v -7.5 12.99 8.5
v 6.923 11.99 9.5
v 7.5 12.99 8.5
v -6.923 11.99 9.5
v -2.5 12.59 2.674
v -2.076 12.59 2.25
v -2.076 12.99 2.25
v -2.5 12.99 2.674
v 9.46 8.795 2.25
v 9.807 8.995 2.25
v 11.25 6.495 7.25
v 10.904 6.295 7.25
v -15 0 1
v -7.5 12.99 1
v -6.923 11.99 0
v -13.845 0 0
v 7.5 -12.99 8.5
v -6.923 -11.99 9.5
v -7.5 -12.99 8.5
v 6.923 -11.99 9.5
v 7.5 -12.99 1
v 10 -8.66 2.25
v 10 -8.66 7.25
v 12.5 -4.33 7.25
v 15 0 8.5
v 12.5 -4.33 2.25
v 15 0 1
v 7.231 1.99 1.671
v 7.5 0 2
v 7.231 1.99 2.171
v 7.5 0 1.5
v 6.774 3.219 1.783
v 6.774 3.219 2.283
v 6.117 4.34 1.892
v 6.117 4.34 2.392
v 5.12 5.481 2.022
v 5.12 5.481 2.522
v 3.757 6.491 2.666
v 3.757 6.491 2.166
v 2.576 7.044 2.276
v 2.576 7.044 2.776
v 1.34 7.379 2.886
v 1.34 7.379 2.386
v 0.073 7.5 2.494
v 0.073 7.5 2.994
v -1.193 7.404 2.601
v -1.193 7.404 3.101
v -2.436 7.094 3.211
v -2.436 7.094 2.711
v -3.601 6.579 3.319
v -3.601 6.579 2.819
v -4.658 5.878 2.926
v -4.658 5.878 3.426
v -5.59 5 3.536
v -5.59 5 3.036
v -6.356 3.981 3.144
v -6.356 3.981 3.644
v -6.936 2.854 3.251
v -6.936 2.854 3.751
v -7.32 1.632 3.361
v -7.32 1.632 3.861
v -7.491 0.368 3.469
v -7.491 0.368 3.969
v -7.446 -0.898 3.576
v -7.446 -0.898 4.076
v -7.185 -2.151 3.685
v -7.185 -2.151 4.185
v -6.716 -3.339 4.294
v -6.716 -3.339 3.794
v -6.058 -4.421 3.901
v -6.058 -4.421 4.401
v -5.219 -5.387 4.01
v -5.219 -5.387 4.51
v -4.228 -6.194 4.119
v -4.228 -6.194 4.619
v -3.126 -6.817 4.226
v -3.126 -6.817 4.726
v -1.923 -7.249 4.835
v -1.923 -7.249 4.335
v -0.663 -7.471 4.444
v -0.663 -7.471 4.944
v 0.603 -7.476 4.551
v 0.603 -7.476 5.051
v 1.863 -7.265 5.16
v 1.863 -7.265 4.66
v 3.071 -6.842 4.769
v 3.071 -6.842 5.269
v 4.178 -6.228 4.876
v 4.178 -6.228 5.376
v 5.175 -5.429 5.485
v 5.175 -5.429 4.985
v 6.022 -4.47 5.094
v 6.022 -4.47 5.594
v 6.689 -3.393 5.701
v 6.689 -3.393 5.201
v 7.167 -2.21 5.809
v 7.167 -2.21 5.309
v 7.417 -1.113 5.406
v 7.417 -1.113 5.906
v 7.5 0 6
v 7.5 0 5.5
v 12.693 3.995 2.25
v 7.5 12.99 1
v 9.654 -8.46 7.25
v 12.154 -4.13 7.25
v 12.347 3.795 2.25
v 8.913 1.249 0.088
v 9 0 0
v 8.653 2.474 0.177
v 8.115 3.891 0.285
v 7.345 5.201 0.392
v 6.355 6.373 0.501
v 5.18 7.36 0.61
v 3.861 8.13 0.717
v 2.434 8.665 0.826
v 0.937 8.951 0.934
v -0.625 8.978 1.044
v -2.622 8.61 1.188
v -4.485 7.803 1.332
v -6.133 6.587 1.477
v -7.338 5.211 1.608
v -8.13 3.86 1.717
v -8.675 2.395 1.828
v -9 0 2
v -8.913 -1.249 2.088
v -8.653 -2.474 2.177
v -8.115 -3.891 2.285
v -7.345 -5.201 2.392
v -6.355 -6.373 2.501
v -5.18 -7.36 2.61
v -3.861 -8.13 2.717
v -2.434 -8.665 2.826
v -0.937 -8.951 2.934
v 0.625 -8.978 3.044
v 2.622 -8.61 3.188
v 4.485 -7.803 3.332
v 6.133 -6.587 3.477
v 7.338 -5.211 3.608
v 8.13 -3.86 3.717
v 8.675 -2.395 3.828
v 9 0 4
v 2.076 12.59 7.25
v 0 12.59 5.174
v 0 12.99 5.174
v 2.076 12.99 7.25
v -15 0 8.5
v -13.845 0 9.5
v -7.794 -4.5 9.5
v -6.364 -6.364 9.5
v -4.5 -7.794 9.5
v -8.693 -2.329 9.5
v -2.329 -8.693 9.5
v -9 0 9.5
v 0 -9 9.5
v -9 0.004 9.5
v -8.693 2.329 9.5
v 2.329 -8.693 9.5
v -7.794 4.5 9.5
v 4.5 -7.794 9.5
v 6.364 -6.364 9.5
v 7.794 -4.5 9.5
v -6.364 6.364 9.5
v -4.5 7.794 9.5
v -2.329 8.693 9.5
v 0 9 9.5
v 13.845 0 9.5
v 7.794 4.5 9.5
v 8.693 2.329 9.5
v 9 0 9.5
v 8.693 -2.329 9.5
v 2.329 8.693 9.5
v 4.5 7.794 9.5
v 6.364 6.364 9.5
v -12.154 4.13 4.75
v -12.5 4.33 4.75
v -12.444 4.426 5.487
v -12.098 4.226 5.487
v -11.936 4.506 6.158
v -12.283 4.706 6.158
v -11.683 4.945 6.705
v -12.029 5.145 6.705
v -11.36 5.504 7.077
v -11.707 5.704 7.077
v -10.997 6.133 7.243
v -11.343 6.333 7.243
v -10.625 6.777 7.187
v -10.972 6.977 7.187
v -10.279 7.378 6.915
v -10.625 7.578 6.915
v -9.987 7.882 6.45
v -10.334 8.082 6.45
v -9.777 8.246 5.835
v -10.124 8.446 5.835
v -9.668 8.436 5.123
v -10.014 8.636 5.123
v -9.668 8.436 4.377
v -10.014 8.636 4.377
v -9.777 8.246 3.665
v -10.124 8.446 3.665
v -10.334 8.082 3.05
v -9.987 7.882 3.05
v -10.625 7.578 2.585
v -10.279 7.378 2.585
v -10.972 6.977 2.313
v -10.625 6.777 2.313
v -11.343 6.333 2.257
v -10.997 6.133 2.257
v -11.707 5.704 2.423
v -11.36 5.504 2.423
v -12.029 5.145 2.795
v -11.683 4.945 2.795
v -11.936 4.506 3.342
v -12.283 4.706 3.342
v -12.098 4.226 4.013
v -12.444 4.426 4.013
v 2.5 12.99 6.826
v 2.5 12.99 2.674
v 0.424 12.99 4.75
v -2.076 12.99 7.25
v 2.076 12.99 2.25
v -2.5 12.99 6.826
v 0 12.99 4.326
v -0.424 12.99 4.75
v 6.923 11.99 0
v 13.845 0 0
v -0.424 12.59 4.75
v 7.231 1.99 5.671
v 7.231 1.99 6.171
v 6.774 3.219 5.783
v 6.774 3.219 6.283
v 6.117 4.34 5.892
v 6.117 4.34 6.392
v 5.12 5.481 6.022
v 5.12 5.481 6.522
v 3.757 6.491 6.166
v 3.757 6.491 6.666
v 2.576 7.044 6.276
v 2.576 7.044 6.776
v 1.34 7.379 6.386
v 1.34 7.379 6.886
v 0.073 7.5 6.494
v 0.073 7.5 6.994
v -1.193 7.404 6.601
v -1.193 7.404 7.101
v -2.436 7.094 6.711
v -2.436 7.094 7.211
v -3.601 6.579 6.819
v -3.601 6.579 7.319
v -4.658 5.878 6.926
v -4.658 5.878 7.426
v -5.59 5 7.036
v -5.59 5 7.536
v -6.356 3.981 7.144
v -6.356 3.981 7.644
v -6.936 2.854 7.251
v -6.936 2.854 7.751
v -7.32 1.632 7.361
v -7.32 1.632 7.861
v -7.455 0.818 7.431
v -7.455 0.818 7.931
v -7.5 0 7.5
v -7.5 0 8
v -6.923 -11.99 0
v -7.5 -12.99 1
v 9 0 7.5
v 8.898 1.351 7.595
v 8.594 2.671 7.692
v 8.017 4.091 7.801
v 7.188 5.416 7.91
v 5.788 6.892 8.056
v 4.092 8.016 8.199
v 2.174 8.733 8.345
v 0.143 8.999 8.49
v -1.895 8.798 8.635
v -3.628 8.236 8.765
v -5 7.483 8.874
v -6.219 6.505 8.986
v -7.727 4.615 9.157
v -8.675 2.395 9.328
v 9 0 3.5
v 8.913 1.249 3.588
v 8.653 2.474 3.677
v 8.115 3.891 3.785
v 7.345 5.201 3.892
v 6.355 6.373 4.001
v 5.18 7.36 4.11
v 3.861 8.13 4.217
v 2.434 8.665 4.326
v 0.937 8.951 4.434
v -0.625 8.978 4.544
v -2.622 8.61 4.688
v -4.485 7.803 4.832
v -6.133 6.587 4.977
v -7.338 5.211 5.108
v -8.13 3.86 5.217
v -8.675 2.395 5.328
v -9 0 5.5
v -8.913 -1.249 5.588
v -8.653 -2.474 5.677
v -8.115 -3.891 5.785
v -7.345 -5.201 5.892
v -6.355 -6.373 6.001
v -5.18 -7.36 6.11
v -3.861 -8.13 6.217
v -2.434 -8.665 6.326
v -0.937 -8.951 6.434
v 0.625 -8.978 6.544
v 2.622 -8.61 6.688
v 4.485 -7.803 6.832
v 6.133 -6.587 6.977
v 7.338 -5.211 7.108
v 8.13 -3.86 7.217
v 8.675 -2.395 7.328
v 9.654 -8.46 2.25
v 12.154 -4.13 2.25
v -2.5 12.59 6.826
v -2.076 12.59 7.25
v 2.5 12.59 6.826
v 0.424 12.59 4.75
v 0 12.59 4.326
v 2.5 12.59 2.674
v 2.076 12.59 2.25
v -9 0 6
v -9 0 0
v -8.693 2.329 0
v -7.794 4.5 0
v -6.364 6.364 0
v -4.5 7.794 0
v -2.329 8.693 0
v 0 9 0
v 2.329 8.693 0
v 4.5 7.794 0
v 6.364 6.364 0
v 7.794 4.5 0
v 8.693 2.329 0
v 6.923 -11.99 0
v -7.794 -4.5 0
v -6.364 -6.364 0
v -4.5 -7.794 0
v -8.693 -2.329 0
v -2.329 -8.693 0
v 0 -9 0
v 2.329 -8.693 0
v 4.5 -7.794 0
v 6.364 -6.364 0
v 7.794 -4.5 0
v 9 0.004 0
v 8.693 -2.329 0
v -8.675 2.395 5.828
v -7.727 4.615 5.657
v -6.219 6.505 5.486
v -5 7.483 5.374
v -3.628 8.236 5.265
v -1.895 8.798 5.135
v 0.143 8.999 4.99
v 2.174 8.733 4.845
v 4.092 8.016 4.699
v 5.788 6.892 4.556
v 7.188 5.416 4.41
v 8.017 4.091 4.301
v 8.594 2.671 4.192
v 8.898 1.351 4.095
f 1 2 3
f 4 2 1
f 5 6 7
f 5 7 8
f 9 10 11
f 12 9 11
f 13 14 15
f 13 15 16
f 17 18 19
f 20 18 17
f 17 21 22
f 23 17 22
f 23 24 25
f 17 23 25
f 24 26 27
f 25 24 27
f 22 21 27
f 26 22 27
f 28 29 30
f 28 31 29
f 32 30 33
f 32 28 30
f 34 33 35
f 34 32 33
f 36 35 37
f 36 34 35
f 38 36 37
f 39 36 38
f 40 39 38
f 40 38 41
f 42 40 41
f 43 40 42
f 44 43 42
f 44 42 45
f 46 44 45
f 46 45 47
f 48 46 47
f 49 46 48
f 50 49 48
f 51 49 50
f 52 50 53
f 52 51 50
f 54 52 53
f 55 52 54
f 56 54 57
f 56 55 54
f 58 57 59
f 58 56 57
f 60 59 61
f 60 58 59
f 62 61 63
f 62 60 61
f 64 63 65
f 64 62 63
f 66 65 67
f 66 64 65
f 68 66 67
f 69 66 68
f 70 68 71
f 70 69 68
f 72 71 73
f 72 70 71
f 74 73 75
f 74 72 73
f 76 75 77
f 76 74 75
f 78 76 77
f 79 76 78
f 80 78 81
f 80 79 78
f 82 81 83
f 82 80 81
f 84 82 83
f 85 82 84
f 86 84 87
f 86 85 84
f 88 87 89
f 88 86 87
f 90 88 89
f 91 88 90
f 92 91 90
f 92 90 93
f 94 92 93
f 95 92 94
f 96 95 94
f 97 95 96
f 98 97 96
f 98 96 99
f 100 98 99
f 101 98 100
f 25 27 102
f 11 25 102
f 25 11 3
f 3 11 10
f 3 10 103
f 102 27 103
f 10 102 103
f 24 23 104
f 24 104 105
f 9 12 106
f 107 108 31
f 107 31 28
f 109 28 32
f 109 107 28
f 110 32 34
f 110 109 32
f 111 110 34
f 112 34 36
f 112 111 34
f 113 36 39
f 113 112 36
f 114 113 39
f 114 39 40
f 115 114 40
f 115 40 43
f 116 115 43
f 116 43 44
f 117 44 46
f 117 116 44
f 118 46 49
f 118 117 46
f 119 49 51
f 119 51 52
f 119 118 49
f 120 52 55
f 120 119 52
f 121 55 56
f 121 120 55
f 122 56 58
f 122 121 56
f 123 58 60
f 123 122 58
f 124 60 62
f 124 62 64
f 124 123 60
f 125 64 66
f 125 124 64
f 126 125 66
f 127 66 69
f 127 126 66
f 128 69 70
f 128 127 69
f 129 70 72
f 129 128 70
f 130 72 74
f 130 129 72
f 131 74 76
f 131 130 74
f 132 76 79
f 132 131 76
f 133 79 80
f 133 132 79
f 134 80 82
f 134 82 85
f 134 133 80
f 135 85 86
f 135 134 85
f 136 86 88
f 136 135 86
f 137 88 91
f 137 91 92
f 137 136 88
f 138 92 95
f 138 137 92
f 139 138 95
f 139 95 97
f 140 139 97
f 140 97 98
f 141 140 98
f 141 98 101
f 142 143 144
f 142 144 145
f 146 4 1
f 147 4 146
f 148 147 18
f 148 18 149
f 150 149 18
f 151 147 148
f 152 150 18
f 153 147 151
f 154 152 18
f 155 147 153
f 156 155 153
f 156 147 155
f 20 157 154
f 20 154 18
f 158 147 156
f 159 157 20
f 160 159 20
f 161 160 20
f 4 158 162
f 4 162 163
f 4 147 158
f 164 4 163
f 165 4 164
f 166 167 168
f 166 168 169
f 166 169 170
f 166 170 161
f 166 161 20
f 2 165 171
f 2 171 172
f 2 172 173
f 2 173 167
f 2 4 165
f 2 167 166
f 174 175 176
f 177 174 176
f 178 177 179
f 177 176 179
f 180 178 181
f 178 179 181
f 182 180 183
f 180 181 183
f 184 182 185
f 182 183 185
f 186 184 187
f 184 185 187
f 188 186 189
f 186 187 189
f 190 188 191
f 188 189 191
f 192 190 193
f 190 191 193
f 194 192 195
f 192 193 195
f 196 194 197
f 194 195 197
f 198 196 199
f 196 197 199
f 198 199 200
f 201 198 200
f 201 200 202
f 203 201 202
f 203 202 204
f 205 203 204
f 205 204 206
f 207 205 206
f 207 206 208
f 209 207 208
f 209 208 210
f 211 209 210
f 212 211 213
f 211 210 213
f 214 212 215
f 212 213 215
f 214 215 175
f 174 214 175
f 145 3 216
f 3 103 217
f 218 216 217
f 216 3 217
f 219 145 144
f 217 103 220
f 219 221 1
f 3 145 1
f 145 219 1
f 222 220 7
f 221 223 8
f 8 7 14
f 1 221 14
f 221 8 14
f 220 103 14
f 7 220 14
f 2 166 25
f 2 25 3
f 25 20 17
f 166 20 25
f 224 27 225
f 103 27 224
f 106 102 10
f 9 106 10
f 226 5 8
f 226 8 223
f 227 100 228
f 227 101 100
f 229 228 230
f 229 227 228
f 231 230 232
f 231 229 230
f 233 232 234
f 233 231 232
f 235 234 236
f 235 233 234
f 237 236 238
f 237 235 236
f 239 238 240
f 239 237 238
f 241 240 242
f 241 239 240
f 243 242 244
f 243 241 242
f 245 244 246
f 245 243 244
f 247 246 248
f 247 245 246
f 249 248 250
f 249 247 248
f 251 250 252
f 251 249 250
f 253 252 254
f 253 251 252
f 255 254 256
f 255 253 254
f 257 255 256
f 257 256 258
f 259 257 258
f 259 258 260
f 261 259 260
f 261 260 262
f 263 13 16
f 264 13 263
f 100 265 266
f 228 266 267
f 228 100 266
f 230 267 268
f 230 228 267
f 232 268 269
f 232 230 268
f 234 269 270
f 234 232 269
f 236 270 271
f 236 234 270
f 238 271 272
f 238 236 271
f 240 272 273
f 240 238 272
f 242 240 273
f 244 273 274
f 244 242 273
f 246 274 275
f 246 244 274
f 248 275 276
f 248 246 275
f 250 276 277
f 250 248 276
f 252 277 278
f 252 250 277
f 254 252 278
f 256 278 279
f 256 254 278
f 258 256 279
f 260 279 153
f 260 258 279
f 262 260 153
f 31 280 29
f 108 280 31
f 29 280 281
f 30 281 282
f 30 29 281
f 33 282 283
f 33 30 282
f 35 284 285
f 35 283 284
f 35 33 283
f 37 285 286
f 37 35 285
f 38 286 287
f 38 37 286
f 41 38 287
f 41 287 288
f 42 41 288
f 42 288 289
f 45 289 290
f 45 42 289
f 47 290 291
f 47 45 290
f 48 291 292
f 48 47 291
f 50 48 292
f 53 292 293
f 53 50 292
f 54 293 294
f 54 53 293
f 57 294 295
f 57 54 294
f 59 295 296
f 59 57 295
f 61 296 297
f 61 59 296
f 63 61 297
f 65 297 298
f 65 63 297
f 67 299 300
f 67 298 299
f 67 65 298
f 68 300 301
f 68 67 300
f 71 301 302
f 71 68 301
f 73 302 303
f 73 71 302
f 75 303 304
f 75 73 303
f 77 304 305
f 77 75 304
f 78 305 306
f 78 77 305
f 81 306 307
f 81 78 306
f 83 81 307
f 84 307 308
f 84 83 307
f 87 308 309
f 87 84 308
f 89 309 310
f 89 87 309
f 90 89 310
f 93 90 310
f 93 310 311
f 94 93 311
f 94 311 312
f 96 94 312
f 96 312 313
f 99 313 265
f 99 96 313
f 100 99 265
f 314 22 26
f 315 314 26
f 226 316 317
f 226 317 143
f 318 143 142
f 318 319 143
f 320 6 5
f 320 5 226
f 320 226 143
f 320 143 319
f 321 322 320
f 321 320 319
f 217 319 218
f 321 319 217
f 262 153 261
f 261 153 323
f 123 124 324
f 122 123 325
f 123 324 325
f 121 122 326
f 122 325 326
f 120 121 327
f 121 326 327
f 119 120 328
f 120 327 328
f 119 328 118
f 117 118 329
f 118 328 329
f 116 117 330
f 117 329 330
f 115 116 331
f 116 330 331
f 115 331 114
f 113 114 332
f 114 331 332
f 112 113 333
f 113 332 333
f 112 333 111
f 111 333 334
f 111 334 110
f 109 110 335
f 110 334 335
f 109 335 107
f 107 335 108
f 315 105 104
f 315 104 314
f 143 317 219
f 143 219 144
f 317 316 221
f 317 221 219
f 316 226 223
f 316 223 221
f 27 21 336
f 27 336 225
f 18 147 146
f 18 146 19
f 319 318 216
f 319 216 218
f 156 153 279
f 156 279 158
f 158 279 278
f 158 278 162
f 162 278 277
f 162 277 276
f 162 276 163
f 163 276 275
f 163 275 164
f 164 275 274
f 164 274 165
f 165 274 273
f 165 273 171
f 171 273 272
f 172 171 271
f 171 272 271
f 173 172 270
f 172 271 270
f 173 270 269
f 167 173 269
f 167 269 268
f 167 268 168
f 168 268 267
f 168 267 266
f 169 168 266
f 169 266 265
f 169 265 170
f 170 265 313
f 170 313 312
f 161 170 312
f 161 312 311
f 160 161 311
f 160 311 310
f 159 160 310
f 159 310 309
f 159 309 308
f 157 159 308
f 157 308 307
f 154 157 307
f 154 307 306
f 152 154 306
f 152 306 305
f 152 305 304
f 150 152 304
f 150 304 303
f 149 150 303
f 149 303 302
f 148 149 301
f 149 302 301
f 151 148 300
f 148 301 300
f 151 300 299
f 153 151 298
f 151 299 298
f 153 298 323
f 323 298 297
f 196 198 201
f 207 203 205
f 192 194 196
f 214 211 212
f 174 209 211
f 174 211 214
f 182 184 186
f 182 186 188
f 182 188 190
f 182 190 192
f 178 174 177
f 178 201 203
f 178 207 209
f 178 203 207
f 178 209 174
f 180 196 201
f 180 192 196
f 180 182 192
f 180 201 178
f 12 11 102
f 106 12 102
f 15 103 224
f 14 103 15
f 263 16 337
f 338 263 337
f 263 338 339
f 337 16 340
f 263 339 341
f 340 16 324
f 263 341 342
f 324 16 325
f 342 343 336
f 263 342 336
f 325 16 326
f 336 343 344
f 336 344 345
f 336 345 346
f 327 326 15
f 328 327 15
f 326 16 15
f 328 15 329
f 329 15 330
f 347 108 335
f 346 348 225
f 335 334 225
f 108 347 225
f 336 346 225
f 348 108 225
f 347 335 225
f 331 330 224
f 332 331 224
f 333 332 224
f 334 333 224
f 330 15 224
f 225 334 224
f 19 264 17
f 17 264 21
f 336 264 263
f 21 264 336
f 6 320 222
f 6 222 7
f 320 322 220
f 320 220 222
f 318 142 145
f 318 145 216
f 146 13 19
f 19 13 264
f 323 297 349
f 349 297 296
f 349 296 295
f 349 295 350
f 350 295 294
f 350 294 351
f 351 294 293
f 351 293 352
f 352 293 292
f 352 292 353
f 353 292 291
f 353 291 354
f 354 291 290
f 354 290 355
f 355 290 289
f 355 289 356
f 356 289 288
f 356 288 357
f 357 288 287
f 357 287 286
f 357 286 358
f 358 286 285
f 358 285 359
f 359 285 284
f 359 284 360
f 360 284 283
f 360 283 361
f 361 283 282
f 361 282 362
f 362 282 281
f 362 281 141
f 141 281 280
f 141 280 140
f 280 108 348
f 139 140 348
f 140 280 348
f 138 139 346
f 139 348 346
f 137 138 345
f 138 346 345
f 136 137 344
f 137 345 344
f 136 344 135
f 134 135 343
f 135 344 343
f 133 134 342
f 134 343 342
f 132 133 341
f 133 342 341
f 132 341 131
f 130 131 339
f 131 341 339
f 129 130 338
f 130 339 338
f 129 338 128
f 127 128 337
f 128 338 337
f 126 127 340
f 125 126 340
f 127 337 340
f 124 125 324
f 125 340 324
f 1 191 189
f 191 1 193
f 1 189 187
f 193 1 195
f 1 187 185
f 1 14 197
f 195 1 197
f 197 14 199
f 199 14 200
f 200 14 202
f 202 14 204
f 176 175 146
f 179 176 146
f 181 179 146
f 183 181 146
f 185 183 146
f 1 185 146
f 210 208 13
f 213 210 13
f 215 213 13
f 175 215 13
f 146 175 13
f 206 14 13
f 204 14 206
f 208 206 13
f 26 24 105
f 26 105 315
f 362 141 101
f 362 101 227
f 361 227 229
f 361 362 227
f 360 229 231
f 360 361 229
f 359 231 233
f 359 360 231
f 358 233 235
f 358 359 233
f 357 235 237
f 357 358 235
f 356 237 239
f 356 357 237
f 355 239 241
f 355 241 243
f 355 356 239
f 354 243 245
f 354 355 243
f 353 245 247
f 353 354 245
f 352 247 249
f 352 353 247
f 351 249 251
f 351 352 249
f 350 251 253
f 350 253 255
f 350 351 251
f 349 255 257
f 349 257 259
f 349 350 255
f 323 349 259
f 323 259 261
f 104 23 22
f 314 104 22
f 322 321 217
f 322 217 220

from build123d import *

# Parameters (mm, degrees)
EXTRUDE_1_DEPTH          = 9.5
SKETCH_3_R               = 9
CUT_EXTRUDE_1_DEPTH      = 10
SWEEP_1_PITCH            = 4
CHAMFER_1_SIZE           = 1
CUT_EXTRUDE_3_DEPTH      = 0.4
SKETCH_12_R              = 2.5
CUT_EXTRUDE_4_DEPTH      = 0.4
CUT_EXTRUDE_6_DEPTH      = 32.468328554
CUT_EXTRUDE_6_DEPTH_BACK = 0.4
SKETCH_11_W              = 5
SKETCH_11_H              = 5
CUT_EXTRUDE_7_DEPTH      = 0.4


with BuildPart() as part:
    # 草图1 → 凸台-拉伸1 (new body)
    with BuildSketch(Plane.XY):
        Polygon((15, 0), (7.5, 12.990381057), (-7.5, 12.990381057), (-15, 0), (-7.5, -12.990381057), (7.5, -12.990381057), align=None)
    extrude(amount=EXTRUDE_1_DEPTH)

    # 草图3 → 切除-拉伸1 (cut)
    with BuildSketch(Plane(origin=(0, 0, 0), x_dir=(-1, 0, 0), z_dir=(0, 0, -1))):
        Circle(SKETCH_3_R)
    extrude(amount=-CUT_EXTRUDE_1_DEPTH, mode=Mode.SUBTRACT)

    # 扫描1: the profile of 草图5 profile screwed along a right-hand helix of 1.5 turns, 12 arcs to a turn; built about Z, then put on its axis
    sweep_1_z = Axis((0, 0, 0), (0, 0, 1))
    sweep_1_corners = [(9.0003, 0, -1.7503), (9.0003, 0, 1.7503), (7.5, 0, 0.25), (7.5, 0, -0.25)]
    with BuildLine(mode=Mode.PRIVATE) as sweep_1_profile:
        Line(sweep_1_corners[0], sweep_1_corners[1])
        Line(sweep_1_corners[1], sweep_1_corners[2])
        Line(sweep_1_corners[2], sweep_1_corners[3])
        Line(sweep_1_corners[3], sweep_1_corners[0])
    sweep_1_cap = Face(sweep_1_profile.wire())
    sweep_1_turn_angles = [0, 15, 30, 45, 60, 75, 90, 105, 120, 135, 150, 165, 180, 195, 210, 225, 240, 255, 270, 285, 300, 315, 330, 345, 360]
    sweep_1_turn_weights = [1, 0.9659258262890683, 1, 0.9659258262890683, 1, 0.9659258262890683, 1, 0.9659258262890683, 1, 0.9659258262890683, 1, 0.9659258262890683, 1, 0.9659258262890683, 1, 0.9659258262890683, 1, 0.9659258262890683, 1, 0.9659258262890683, 1, 0.9659258262890683, 1, 0.9659258262890683, 1]
    sweep_1_turn_rails = [Edge.make_bspline([Vector(p[0], p[1], 0).rotate(sweep_1_z, sweep_1_turn_angles[k]) / sweep_1_turn_weights[k] + Vector(0, 0, p[2] + SWEEP_1_PITCH * sweep_1_turn_angles[k] / 360) for k in range(25)], [0, 0, 0, 1, 1, 2, 2, 3, 3, 4, 4, 5, 5, 6, 6, 7, 7, 8, 8, 9, 9, 10, 10, 11, 11, 12, 12, 12], 2, sweep_1_turn_weights) for p in sweep_1_corners]
    sweep_1_turn_sides = [Face.make_surface_from_curves(sweep_1_turn_rails[p[0]], sweep_1_turn_rails[p[1]]) for p in [(0, 1), (1, 2), (2, 3), (3, 0)]]
    sweep_1_last_angles = [360, 375, 390, 405, 420, 435, 450, 465, 480, 495, 510, 525, 540]
    sweep_1_last_weights = [1, 0.9659258262890683, 1, 0.9659258262890683, 1, 0.9659258262890683, 1, 0.9659258262890683, 1, 0.9659258262890683, 1, 0.9659258262890658, 1]
    sweep_1_last_rails = [Edge.make_bspline([Vector(p[0], p[1], 0).rotate(sweep_1_z, sweep_1_last_angles[k]) / sweep_1_last_weights[k] + Vector(0, 0, p[2] + SWEEP_1_PITCH * sweep_1_last_angles[k] / 360) for k in range(13)], [0, 0, 0, 1, 1, 2, 2, 3, 3, 4, 4, 5, 5, 6, 6, 6], 2, sweep_1_last_weights) for p in sweep_1_corners]
    sweep_1_last_sides = [Face.make_surface_from_curves(sweep_1_last_rails[p[0]], sweep_1_last_rails[p[1]]) for p in [(0, 1), (1, 2), (2, 3), (3, 0)]]
    sweep_1 = Plane(origin=(0, 0, 1.75), x_dir=(1, 0, 0), z_dir=(0, 0, 1)) * Solid(Shell([*sweep_1_turn_sides, *sweep_1_last_sides, sweep_1_cap, sweep_1_cap.rotate(sweep_1_z, 540).moved(Location((0, 0, SWEEP_1_PITCH * 540 / 360)))]))
    add(sweep_1)

    # 倒角1
    chamfer_1_edges = [part.edges().sort_by_distance(p)[0] for p in [
        (-11.25, 6.495190528, 9.5),
        (-11.25, -6.495190528, 9.5),
        (0, -12.990381057, 9.5),
        (11.25, -6.495190528, 9.5),
        (11.25, 6.495190528, 9.5),
        (11.25, -6.495190528, 0),
        (0, -12.990381057, 0),
        (-11.25, -6.495190528, 0),
        (-11.25, 6.495190528, 0),
        (0, 12.990381057, 0),
        (11.25, 6.495190528, 0),
        (0, 12.990381057, 9.5),
    ]]
    chamfer(chamfer_1_edges, length=CHAMFER_1_SIZE)

    # 草图7 → 切除-拉伸3 (cut)
    with BuildSketch(Plane(origin=(11.25, 6.495190528, 0), x_dir=(0, 0, -1), z_dir=(0.8660254037844386, 0.5000000000000003, 0))):
        Polygon((-2.25, 2.886751346), (-7.25, 0), (-2.25, -2.886751346), align=None)
    extrude(amount=-CUT_EXTRUDE_3_DEPTH, mode=Mode.SUBTRACT)

    # 草图12 → 切除-拉伸4 (cut)
    with BuildSketch(Plane(origin=(-11.25, 6.495190528, 0), x_dir=(0, 0, 1), z_dir=(-0.8660254037844384, 0.5000000000000006, 0))):
        with Locations(Location((4.75, 0, 0), (0, 0, 270))):
            Circle(SKETCH_12_R)
    extrude(amount=-CUT_EXTRUDE_4_DEPTH, mode=Mode.SUBTRACT)

    # 草图10 → 切除-拉伸6 (cut, two sides: drawn at the far end of the back side and taken through both)
    with BuildSketch(Plane(origin=(0, 12.990381057, 0), x_dir=(1, 0, 0), z_dir=(0, 1, 0)).offset(-CUT_EXTRUDE_6_DEPTH_BACK)):
        Polygon((2.075735931, -2.25), (-2.5, -6.825735931), (-2.075735931, -7.25), (2.5, -2.674264069), align=None)
        Polygon((-2.5, -2.674264069), (2.075735931, -7.25), (2.5, -6.825735931), (-2.075735931, -2.25), align=None)
    extrude(amount=CUT_EXTRUDE_6_DEPTH + CUT_EXTRUDE_6_DEPTH_BACK, mode=Mode.SUBTRACT)

    # 草图11 → 切除-拉伸7 (cut)
    with BuildSketch(Plane(origin=(11.25, -6.495190528, 0), x_dir=(0, 0, -1), z_dir=(0.8660254037844387, -0.5000000000000001, 0))):
        with Locations((-4.75, 0)):
            Rectangle(SKETCH_11_W, SKETCH_11_H)
    extrude(amount=-CUT_EXTRUDE_7_DEPTH, mode=Mode.SUBTRACT)


solid = part.part
